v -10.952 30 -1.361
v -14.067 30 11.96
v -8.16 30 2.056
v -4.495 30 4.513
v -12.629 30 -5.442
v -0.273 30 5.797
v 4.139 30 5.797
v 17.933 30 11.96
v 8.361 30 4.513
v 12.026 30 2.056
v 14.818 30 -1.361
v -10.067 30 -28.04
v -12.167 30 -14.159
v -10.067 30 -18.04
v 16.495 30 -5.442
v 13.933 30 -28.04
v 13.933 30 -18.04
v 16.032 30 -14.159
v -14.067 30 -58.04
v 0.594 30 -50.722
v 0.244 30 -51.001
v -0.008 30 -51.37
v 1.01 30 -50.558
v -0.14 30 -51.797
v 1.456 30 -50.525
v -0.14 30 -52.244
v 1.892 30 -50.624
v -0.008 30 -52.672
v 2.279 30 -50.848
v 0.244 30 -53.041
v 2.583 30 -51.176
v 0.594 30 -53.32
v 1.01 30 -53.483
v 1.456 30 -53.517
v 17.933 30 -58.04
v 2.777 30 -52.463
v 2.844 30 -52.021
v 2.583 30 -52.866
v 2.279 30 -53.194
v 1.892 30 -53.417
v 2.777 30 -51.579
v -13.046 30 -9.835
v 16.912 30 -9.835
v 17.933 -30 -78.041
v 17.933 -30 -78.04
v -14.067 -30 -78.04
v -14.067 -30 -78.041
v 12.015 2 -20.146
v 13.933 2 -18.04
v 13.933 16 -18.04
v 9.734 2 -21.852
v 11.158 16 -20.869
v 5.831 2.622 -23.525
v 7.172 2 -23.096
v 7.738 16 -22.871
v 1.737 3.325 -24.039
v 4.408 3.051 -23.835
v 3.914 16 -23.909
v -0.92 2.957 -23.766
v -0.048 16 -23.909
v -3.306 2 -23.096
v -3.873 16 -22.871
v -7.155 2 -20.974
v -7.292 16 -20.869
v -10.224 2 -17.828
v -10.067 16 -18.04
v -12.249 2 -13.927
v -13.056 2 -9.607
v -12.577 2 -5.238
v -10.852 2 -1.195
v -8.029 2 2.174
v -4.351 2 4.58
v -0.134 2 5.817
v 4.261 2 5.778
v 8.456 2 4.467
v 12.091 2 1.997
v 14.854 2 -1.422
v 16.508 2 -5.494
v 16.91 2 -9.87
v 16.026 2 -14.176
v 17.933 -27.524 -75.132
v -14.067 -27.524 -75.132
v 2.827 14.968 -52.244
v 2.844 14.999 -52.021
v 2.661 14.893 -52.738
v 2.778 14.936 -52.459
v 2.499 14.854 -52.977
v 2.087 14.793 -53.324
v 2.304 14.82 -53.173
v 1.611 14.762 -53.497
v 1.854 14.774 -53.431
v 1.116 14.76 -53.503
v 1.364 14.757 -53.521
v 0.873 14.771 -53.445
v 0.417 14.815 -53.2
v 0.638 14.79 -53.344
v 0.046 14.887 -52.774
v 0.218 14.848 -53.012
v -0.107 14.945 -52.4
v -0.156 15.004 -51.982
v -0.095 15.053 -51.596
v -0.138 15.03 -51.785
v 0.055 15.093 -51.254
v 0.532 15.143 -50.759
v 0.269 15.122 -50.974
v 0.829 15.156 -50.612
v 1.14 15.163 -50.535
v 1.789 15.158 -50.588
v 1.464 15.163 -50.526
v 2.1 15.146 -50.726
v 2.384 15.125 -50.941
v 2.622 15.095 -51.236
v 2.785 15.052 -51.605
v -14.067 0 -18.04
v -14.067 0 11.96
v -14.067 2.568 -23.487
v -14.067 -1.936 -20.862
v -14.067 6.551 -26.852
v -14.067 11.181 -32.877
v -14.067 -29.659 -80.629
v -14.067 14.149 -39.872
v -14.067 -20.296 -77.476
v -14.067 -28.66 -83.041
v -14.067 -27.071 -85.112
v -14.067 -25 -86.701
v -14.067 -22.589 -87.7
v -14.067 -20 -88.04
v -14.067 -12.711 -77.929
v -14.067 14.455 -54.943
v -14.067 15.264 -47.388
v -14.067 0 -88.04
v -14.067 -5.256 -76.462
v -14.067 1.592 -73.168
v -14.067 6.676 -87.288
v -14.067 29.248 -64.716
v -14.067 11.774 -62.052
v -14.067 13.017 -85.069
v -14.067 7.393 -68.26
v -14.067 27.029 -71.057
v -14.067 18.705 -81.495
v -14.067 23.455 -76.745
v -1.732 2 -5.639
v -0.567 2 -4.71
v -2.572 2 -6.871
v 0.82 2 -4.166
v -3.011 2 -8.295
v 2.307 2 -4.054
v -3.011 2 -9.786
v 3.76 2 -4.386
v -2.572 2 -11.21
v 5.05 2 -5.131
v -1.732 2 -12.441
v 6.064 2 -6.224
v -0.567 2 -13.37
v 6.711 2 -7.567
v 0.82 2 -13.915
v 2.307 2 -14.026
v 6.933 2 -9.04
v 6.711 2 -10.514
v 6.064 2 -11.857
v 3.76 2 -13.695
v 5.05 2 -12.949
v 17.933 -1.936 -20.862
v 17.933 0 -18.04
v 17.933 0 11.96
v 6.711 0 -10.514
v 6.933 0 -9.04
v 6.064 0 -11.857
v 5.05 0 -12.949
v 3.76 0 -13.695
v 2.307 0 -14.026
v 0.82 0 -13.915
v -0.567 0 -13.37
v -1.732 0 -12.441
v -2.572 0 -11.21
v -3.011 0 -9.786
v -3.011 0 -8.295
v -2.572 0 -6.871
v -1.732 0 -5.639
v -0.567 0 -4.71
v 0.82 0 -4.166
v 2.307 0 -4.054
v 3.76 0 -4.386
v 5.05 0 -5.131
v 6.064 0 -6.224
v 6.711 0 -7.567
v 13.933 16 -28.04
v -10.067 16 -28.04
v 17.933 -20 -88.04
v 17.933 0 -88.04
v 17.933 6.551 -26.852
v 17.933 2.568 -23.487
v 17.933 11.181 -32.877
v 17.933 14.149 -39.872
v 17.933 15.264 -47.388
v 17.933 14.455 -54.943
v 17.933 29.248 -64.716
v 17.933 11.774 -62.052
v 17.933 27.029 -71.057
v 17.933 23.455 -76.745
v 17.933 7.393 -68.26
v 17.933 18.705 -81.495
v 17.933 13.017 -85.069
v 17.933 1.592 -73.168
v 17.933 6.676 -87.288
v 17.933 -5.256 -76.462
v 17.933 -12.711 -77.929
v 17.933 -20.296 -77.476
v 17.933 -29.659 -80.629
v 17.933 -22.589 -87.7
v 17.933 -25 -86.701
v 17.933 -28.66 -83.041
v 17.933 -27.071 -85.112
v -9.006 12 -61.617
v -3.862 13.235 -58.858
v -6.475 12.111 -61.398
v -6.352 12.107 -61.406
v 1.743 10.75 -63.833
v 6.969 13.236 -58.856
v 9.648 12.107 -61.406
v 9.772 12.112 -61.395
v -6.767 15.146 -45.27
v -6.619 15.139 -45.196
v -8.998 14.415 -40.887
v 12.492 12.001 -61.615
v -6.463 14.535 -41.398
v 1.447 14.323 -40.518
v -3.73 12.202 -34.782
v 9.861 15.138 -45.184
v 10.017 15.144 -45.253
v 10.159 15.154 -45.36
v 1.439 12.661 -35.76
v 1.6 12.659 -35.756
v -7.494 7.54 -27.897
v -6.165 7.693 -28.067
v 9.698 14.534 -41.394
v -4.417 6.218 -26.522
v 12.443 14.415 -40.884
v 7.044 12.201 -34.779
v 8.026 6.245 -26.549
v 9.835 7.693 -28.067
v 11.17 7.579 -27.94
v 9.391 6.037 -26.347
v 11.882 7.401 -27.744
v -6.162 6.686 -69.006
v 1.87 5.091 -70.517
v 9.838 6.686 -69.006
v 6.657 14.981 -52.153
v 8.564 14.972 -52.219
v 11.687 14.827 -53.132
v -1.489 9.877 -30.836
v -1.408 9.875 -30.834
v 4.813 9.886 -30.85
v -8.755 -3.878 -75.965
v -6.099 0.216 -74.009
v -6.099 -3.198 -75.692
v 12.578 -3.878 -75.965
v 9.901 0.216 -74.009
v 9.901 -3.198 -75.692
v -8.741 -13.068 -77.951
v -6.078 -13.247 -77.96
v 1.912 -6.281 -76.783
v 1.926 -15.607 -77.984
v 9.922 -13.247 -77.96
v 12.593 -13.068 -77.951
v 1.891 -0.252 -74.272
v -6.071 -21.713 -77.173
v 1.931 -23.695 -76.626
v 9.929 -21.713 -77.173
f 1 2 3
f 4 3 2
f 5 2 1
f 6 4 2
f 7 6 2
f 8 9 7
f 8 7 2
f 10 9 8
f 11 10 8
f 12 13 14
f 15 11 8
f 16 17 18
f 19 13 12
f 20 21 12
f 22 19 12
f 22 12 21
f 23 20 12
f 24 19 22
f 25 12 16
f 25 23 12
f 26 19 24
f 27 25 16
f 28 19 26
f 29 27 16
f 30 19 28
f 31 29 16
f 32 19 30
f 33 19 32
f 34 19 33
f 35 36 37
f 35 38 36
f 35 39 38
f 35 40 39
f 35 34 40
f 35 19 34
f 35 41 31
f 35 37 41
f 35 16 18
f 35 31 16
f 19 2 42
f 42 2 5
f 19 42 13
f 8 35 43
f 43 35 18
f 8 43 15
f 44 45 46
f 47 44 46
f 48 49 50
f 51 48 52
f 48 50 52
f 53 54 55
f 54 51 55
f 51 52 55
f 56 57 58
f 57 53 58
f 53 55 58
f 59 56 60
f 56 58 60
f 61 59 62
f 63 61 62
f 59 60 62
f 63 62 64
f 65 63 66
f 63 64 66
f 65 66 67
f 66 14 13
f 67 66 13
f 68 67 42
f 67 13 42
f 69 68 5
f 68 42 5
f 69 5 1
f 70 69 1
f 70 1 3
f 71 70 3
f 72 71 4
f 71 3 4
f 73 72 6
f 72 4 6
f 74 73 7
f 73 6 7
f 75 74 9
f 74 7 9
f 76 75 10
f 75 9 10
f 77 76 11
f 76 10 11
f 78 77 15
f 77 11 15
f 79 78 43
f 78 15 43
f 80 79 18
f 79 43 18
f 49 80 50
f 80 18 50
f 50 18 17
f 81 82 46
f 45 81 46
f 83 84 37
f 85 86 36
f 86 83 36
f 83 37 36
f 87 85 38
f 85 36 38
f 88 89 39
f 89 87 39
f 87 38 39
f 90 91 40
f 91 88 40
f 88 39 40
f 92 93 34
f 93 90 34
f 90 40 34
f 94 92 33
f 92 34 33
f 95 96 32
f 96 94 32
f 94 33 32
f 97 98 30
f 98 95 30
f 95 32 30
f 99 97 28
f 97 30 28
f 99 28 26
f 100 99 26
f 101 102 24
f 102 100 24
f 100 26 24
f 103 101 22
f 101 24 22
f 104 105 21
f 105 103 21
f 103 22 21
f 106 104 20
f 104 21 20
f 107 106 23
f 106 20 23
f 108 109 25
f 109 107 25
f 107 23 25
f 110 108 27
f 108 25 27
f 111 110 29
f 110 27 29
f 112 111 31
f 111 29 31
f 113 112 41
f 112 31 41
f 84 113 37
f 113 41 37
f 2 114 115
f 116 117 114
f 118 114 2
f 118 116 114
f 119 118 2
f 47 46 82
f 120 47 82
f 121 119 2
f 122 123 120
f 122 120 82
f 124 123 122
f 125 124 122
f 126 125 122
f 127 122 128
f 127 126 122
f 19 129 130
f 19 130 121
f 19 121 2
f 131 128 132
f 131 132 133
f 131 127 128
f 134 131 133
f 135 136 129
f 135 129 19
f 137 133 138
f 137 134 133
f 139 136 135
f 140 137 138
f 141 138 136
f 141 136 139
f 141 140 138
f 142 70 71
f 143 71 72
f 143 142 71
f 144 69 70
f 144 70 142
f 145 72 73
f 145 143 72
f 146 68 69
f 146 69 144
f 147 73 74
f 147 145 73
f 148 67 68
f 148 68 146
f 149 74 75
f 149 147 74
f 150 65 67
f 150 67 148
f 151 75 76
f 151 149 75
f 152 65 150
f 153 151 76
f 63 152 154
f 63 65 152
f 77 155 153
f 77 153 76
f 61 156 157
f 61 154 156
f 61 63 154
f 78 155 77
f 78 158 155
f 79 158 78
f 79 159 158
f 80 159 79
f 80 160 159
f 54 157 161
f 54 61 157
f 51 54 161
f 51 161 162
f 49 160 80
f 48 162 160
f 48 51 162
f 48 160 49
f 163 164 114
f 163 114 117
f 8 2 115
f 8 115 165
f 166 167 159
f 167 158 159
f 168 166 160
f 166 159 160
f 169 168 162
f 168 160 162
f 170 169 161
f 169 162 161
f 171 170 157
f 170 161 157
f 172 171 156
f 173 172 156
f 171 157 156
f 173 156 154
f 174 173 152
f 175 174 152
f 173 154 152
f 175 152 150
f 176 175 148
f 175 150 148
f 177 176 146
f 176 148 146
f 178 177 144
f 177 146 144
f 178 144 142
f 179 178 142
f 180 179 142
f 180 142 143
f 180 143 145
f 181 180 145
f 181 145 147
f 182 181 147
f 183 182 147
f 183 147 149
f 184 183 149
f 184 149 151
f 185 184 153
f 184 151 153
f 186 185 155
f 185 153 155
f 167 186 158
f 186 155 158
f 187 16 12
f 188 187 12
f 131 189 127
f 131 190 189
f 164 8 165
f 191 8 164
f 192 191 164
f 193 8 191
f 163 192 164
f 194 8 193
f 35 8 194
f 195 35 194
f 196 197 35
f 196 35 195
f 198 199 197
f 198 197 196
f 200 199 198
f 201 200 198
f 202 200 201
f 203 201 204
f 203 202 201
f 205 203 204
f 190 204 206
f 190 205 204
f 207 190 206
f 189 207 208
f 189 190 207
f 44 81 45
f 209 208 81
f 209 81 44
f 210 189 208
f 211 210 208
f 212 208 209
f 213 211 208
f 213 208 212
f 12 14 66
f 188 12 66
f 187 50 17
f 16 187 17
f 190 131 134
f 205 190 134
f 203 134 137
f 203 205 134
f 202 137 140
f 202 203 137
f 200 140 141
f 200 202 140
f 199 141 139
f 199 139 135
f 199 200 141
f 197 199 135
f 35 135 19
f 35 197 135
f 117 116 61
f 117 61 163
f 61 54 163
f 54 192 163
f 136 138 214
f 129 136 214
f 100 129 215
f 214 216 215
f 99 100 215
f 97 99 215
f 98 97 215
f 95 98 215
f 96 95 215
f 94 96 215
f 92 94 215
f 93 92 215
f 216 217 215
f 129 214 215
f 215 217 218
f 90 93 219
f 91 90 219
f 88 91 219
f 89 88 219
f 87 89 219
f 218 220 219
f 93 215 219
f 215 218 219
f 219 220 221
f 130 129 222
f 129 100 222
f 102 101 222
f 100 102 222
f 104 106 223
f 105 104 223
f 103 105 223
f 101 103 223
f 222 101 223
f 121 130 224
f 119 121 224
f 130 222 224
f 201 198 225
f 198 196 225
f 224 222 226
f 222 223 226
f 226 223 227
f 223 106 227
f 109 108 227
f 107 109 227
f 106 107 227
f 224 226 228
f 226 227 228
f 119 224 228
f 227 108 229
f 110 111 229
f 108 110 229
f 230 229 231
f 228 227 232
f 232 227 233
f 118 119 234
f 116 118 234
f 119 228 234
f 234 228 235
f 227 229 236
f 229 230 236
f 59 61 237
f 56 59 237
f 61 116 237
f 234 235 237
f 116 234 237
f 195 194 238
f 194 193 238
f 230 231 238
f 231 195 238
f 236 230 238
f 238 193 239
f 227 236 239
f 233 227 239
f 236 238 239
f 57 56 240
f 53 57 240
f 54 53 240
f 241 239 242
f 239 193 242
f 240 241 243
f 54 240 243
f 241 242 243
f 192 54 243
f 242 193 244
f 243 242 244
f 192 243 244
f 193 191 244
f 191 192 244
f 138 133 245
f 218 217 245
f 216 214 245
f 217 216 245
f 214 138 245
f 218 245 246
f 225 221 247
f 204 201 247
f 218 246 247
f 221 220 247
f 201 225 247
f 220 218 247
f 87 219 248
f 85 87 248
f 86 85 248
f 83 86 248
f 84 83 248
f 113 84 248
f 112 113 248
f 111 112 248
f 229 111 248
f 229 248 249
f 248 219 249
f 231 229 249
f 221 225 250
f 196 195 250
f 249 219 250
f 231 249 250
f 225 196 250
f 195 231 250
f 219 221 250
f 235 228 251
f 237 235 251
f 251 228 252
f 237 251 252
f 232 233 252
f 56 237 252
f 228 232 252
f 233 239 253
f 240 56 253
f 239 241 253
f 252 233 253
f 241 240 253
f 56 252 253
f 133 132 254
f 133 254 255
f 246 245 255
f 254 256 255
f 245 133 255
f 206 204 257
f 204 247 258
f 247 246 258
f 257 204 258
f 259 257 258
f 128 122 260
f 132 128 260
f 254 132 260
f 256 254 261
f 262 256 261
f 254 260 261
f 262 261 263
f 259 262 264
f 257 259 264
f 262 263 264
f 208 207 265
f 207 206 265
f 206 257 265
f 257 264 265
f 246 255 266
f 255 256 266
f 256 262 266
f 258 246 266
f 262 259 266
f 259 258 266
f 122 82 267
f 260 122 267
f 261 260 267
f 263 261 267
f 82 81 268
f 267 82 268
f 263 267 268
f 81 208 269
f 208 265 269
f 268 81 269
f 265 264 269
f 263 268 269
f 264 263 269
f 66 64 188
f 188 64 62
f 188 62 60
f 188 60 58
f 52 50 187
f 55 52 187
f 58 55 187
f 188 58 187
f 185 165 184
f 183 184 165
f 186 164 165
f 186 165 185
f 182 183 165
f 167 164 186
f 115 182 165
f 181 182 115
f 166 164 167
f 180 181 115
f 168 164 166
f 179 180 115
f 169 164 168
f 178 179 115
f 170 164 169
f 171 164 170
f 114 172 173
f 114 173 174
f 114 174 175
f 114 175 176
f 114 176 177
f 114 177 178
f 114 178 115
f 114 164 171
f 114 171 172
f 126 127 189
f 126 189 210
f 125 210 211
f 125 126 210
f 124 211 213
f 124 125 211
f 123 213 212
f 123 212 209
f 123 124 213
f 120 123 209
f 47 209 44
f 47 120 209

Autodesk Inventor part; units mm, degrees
ref_plane "YZ Plane" through (0, 0, 0) normal (1, 0, 0) x (0, 1, 0)
ref_plane "XZ Plane" through (0, 0, 0) normal (0, 1, 0) x (-1, 0, 0)
ref_plane "XY Plane" through (0, 0, 0) normal (0, 0, 1) x (1, 0, 0)
sketch "Esquisse1" plane through (0, 0, 0) normal (0, 1, 0) x (-1, 0, 0)
  line L0 (14.0671, 6.9597) -> (-17.9329, 6.9597)
  line L1 (-17.9329, 6.9597) -> (-17.9329, -18.0403)
  line L2 (-17.9329, -18.0403) -> (14.0671, -18.0403)
  line L3 (14.0671, -18.0403) -> (14.0671, 6.9597)
  point P0 (0, 0)
  dimension "d0" = 25
  dimension "d1" = 32
extrude "Extrusion1" add sketch "Esquisse1" along normal blind 30
sketch "Esquisse2" plane through (0, 30, 0) normal (0, 1, 0) x (1, 0, 0)
  circle A0 centre (1.9329, 9.0403) radius 15
  line L0 (-14.0671, 18.0403) -> (-14.0671, -6.9597) projected
  line L1 (-14.0671, -6.9597) -> (17.9329, -6.9597) projected
  point P0 (0, 0)
  dimension "d4" = 30
  dimension "d5" = 16
  dimension "d6" = 16
extrude "Extrusion2" cut sketch "Esquisse2" against normal blind 28
sketch "Esquisse3" plane through (1.9329, 2, -9.0403) normal (0, 1, 0) x (1, 0, 0)
  circle A0 centre (0, 0) radius 5
  line L0 (16, 9) -> (-16, 9) projected
  line L1 (-16, 9) -> (-16, -16) projected
  line L2 (-16, -16) -> (16, -16) projected
  point P0 (-1.9329, -9.0403)
  dimension "d9" = 10
  dimension "d11" = 16
  dimension "d14" = 16
extrude "Extrusion3" cut sketch "Esquisse3" against normal through all
sketch "Esquisse5" plane through (17.9329, 0, -18.0403) normal (0, 0, -1) x (-1, 0, 0)
  line L0 (28, 30) -> (28, 2) projected
  line L1 (32, 30) -> (28, 30)
  line L2 (28, 30) -> (28, 16)
  line L3 (28, 16) -> (32, 16)
  line L4 (32, 16) -> (32, 30)
  line L5 (28, 30) -> (32, 30) projected
  line L6 (32, 0) -> (32, 30) projected
  line L7 (4, 2) -> (4, 30) projected
  line L8 (0, 30) -> (4, 30) projected
  line L9 (4, 16) -> (0, 16)
  line L10 (0, 16) -> (0, 30)
  line L11 (0, 30) -> (4, 30)
  line L12 (4, 30) -> (4, 16)
  point P0 (17.9329, 0)
  dimension "d15" = 14
  dimension "d16" = 0
  dimension "d17" = 0
  dimension "d18" = 14
extrude "Extrusion4" add sketch "Esquisse5" along normal blind 10
sketch "Esquisse6" plane through (17.9329, 0, -28.0403) normal (0, 0, -1) x (-1, 0, 0)
  line L0 (32, 16) -> (28, 16) projected
  line L1 (32, 30) -> (0, 30) projected
  line L2 (32, 16) -> (0, 16)
  line L3 (0, 16) -> (0, 30)
  line L4 (0, 30) -> (32, 30)
  line L5 (32, 30) -> (32, 16)
  point P0 (17.9329, 0)
extrude "Extrusion5" add sketch "Esquisse6" along normal blind 50
sketch "Esquisse7" plane through (17.9329, 0, -78.0403) normal (0, 0, -1) x (-1, 0, 0)
  line L0 (32, 30) -> (0, 30) projected
  line L1 (32, 30) -> (0, 30)
  line L2 (0, 30) -> (0, -30)
  line L3 (0, -30) -> (32, -30)
  line L4 (32, -30) -> (32, 30)
  point P0 (17.9329, 0)
  dimension "d23" = 60
extrude "Extrusion6" add sketch "Esquisse7" along normal blind 10
sketch "Esquisse8" plane through (17.9329, 0, 6.9597) normal (1, 0, 0) x (0, 0, -1)
  ellipse E0 centre (54.9571, -14.73) end of major axis (54.9571, -44.73) minor radius 29.9996 projected
  ellipse E1 centre (54.9571, -14.73) end of major axis (54.9571, 12.27) minor radius 26.9996 projected
  ellipse E2 centre (54.9571, -14.73) end of major axis (54.9571, -44.73) minor radius 29.9996 projected
  arc A0 (82.092, -27.5236) -> (27.8222, -1.9363) centre (54.9571, -14.73) ccw
  line L0 (85, 16) -> (85, -30) projected
  line L1 (82.092, -27.5236) -> (85, -30)
  line L2 (25, 16) -> (85, 16) projected
  line L3 (85, -30) -> (85, 16)
  line L4 (85, 16) -> (25, 16)
  line L5 (25, 0) -> (25, 16) projected
  line L6 (25, 16) -> (25, 0)
  line L7 (25, 0) -> (27.8222, -1.9363)
  point P0 (6.9597, 0)
extrude "Extrusion7" add sketch "Esquisse8" against normal blind 32 contours E0 L7 L5 L2 L0 L1
fillet "Congé1" radius 30 1 edges at (1.9329, 30, -88.0403)
fillet "Congé2" radius 10 1 edges at (1.9329, -30, -88.0403)
sketch "Esquisse9" plane through (-10.0671, 16, -28.0403) normal (0, 1, 0) x (1, 0, 0)
  circle A0 centre (12, -19) radius 5 projected
  line L0 (0, -10) -> (24, -10) projected
  arc A1 (0, -10) -> (24, -10) centre (12, -19) ccw projected
  circle A2 centre (12, -19) radius 15
  point P0 (10.0671, -28.0403)
  dimension "d30" = 30
extrude "Extrusion8" cut sketch "Esquisse9" against normal up to surface (14 mm away) contours A2 L0
sketch "Esquisse10" plane through (-14.0671, 0, 6.9597) normal (0, 0, 1) x (1, 0, 0)
  line L0 (32, 15.27) -> (32, -27.5236) projected
  line L1 (0, 30) -> (32, 30)
  line L2 (32, 30) -> (32, 0)
  line L3 (32, 0) -> (0, 0)
  line L4 (0, 0) -> (0, 30)
  point P0 (14.0671, 0)
  point P1 (32, -1.9363)
extrude "Extrusion9" add sketch "Esquisse10" along normal blind 5
sketch "Esquisse11" plane through (0, 30, 0) normal (0, 1, 0) x (1, 0, 0)
  circle A0 centre (1.3437, 52.0208) radius 1.5 projected
  point P0 (0, 0)
extrude "Extrusion10" cut sketch "Esquisse11" against normal through all
properties part number "support-moteur"
